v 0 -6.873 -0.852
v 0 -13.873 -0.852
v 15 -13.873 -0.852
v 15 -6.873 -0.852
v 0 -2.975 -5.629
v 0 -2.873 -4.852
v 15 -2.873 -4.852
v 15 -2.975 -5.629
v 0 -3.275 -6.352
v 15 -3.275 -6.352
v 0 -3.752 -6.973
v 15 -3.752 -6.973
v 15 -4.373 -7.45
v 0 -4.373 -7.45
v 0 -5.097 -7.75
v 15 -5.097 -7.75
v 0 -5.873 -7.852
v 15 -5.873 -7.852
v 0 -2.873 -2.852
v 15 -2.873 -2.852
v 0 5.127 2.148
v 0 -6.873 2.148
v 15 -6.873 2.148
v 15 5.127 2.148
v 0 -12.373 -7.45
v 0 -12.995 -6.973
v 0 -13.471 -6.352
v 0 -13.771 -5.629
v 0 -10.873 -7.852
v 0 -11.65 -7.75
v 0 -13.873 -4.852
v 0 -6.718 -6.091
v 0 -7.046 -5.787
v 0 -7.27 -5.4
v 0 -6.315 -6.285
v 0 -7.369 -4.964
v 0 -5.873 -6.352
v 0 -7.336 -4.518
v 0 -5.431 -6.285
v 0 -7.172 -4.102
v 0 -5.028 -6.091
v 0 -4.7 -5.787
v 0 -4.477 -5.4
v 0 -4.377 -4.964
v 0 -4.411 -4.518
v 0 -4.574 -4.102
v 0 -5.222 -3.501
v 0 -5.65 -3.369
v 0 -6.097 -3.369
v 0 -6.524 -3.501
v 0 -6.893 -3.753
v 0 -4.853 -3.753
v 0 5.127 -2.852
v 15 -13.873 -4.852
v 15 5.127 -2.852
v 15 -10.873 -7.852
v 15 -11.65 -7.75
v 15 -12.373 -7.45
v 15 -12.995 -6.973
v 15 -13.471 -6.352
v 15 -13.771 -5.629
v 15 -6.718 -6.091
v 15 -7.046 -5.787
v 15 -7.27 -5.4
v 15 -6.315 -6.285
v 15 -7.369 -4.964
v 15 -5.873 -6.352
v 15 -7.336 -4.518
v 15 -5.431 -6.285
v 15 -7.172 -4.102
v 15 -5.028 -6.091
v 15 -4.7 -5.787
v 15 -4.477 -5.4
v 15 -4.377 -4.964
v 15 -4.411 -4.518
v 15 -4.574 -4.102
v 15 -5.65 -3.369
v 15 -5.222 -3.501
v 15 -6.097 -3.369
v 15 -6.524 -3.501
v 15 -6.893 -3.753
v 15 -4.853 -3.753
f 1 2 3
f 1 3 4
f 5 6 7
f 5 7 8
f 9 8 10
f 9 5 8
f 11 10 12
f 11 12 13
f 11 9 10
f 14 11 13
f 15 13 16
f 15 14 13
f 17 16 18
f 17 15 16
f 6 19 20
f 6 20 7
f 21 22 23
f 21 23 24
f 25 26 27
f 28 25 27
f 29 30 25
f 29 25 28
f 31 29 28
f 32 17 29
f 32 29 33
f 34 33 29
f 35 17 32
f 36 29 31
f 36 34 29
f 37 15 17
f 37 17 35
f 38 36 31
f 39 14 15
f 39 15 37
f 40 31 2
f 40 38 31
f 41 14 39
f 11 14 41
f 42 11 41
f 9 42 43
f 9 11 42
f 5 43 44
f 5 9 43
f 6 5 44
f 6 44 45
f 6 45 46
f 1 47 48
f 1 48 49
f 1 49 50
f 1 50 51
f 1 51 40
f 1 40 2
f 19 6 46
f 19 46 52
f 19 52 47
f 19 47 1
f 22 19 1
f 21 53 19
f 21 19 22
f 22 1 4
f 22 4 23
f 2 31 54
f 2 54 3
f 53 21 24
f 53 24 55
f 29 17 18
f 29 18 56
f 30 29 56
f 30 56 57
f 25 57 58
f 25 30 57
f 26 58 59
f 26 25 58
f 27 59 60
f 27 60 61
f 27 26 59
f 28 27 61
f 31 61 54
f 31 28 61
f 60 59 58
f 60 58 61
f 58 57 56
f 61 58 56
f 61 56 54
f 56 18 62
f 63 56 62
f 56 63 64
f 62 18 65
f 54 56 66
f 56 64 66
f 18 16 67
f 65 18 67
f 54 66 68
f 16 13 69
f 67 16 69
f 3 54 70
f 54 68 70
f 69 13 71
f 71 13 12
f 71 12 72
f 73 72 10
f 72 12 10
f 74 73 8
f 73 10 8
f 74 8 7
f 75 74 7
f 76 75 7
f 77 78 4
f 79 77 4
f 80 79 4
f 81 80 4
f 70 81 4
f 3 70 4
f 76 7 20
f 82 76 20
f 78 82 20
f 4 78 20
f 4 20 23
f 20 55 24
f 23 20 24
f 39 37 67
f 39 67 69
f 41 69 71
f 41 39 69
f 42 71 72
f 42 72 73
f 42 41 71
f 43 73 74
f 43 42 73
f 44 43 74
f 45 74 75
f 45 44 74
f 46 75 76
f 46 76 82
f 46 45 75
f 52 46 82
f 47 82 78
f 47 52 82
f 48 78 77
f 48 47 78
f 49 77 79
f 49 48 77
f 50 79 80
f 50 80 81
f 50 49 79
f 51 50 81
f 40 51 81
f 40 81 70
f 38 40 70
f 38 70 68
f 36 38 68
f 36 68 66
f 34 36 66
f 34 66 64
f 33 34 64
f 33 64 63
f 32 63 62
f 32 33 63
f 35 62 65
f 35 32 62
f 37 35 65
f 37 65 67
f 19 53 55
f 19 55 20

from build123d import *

# Parameters (mm, degrees)
SKETCH1_R           = 1.5
BOSS_EXTRUDE1_DEPTH = 15


with BuildPart() as part:
    # Sketch1 → Boss-Extrude1 (new body)
    with BuildSketch(Plane(origin=(0, 0, 0), x_dir=(0, 0, -1), z_dir=(1, 0, 0))):
        with BuildLine():
            Line((-2.147887324, 5.126760563), (2.852112676, 5.126760563))
            Line((2.852112676, 5.126760563), (2.852112676, -2.873239437))
            Line((2.852112676, -2.873239437), (4.852112676, -2.873239437))
            ThreePointArc((4.852112676, -2.873239437), (6.97343302, -3.751919093), (7.852112676, -5.873239437))
            Line((7.852112676, -5.873239437), (7.852112676, -10.873239437))
            ThreePointArc((7.852112676, -10.873239437), (6.97343302, -12.99455978), (4.852112676, -13.873239437))
            Line((4.852112676, -13.873239437), (0.852112676, -13.873239437))
            Line((0.852112676, -13.873239437), (0.852112676, -6.873239437))
            Line((0.852112676, -6.873239437), (-2.147887324, -6.873239437))
            Line((-2.147887324, -6.873239437), (-2.147887324, 5.126760563))
        make_face()
        with Locations((4.852112676, -5.873239437)):
            Circle(SKETCH1_R, mode=Mode.SUBTRACT)
    extrude(amount=BOSS_EXTRUDE1_DEPTH)


solid = part.part
